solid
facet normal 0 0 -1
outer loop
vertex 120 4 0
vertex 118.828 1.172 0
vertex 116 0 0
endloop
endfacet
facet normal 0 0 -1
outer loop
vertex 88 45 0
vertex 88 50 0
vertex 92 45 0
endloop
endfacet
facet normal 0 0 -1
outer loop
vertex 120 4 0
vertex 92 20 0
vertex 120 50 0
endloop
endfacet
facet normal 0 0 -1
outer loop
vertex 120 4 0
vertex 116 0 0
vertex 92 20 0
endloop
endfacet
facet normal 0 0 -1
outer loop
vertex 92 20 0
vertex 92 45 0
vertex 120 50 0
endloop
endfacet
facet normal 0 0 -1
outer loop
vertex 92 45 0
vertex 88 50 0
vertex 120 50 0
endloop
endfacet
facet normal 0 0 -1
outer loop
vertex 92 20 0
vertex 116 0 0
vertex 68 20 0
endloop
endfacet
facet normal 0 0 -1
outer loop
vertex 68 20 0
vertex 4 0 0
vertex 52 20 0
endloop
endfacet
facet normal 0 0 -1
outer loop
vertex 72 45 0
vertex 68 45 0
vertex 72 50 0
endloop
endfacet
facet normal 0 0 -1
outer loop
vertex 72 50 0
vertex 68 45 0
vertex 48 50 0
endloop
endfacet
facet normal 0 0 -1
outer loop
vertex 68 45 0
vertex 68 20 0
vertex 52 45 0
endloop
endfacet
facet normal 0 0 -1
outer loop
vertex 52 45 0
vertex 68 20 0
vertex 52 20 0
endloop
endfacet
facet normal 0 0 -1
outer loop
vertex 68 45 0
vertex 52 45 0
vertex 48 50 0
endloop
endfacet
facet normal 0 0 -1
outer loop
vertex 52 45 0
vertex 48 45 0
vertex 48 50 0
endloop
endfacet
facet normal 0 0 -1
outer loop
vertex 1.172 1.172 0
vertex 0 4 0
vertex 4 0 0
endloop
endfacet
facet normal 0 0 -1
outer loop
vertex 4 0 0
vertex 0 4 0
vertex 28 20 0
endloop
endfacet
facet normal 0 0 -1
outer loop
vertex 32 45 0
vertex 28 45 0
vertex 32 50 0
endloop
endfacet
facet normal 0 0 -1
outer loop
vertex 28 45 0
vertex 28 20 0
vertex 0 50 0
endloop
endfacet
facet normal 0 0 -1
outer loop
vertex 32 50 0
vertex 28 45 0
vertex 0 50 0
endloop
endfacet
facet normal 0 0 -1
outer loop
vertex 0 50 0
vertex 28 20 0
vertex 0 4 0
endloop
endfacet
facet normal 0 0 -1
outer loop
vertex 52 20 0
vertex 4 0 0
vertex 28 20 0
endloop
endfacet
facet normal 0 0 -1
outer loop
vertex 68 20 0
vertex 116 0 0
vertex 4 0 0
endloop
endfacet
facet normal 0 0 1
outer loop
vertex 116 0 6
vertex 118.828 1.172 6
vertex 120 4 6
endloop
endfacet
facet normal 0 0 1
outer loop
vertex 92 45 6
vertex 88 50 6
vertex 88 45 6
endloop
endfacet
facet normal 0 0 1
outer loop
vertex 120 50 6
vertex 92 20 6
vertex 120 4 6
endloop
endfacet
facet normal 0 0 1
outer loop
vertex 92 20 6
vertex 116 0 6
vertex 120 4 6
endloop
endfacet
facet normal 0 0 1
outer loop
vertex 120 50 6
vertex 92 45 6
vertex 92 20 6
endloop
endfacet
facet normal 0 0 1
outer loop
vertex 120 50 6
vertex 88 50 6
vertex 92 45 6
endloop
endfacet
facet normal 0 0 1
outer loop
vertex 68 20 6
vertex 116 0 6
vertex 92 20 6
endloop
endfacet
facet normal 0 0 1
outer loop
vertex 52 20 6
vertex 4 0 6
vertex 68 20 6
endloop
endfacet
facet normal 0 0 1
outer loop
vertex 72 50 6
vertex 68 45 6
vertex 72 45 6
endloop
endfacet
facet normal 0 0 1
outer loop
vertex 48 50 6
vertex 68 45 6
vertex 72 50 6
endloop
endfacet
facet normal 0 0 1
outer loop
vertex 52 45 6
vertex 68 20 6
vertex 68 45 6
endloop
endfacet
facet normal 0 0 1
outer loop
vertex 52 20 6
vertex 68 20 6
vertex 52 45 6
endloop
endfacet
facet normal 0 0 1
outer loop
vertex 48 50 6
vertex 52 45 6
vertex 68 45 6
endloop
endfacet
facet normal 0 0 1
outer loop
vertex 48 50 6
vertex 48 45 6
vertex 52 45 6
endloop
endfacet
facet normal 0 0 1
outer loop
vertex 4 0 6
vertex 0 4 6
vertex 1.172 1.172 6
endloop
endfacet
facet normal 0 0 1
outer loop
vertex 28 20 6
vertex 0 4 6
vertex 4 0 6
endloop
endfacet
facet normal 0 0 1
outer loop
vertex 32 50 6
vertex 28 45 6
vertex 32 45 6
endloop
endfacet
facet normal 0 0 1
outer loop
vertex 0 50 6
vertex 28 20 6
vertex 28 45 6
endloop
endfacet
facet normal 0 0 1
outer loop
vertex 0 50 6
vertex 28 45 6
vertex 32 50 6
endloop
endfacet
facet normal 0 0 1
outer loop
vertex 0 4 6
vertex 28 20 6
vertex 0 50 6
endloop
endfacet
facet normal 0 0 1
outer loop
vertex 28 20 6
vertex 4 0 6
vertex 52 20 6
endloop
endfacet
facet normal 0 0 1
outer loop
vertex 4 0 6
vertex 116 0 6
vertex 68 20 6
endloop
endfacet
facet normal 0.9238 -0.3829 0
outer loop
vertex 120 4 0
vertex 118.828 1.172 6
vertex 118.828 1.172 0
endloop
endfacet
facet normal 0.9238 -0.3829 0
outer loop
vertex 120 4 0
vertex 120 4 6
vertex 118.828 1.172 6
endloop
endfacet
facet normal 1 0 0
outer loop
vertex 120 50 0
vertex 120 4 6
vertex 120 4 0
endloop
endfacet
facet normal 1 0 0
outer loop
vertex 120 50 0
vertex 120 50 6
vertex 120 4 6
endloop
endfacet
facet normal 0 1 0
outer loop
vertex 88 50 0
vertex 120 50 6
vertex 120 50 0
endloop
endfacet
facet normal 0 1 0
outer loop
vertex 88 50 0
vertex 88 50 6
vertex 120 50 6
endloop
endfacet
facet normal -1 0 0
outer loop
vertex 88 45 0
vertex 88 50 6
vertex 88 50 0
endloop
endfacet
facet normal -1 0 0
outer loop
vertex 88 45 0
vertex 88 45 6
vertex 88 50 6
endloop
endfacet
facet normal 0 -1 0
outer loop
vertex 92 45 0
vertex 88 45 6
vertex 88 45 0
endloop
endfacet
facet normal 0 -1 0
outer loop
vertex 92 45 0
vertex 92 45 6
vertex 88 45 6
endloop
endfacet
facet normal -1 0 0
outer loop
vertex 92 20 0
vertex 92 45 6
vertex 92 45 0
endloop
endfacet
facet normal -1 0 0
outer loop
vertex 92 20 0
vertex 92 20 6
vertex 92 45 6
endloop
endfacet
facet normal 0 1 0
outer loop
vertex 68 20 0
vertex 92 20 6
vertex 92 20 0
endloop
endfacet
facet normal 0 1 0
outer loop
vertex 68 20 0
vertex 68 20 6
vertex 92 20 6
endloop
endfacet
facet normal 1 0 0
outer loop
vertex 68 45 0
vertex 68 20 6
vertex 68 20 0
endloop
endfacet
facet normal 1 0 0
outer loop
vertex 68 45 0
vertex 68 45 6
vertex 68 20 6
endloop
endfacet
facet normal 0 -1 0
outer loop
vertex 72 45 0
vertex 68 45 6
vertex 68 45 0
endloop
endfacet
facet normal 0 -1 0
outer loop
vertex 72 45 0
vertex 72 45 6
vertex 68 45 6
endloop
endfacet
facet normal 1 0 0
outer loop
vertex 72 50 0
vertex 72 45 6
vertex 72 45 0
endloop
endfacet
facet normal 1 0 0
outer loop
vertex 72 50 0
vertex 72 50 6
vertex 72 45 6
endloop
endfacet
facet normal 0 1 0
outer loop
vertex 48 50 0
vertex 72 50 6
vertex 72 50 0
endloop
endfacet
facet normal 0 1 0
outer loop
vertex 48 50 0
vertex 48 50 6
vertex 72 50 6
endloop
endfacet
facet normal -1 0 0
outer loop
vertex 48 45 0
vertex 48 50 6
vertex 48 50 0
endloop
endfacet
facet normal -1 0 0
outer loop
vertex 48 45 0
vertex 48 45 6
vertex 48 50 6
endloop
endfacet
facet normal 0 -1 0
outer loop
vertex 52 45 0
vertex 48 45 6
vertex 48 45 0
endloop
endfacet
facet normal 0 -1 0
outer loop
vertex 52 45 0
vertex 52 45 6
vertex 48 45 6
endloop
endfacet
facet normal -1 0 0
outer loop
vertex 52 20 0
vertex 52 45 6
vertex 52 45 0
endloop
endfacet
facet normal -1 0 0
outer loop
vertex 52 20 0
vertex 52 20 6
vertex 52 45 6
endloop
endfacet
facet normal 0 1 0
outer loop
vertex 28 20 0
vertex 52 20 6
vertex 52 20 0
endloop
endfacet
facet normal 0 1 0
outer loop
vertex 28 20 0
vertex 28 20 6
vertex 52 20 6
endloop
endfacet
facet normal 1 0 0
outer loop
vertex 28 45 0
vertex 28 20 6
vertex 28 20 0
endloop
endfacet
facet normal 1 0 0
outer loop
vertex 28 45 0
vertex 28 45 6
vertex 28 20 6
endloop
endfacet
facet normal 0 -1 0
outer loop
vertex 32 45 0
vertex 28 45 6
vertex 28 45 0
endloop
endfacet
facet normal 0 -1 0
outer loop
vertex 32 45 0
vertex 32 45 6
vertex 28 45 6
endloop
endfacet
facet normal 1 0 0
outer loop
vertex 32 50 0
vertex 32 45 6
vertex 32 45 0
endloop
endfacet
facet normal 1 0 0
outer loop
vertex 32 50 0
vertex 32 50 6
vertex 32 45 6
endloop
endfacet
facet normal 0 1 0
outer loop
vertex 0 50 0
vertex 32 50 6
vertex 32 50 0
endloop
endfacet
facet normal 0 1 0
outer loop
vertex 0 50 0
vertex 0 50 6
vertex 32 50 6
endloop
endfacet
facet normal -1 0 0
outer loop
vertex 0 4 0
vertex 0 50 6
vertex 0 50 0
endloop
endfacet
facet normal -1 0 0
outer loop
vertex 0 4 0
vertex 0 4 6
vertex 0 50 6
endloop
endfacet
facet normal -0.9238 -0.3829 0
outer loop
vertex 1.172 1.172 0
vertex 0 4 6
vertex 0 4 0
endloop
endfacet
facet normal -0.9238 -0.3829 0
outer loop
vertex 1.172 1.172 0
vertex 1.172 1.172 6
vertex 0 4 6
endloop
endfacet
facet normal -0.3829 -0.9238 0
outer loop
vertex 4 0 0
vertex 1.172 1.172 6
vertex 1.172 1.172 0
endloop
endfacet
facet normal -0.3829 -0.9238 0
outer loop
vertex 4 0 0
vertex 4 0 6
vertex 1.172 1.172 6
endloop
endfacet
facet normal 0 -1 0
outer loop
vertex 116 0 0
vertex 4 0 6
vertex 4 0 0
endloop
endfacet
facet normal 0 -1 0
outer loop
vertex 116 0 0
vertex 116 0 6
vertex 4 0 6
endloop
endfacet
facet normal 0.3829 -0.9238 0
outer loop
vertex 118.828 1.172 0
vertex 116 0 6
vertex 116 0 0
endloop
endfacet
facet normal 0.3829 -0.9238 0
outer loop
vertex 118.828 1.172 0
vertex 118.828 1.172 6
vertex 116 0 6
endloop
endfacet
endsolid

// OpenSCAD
$fn = 32;

// ----------------------------------------------------------------------
// Oversize slot bar: 120 mm bar with 2 oversize windows
// ----------------------------------------------------------------------

// --- parameters (mm) ---
profile_height = 6;       // extrusion height
profile_points = 24;      // points of the closed outline

profile = [[0, 4], [1.172, 1.172], [4, 0], [116, 0], [118.828, 1.172], [120, 4], [120, 50], [88, 50], [88, 45], [92, 45], [92, 20], [68, 20], [68, 45], [72, 45], [72, 50], [48, 50], [48, 45], [52, 45], [52, 20], [28, 20], [28, 45], [32, 45], [32, 50], [0, 50]];  // single closed polygon, 24 points, counter clockwise

// --- the one profile operation ---
linear_extrude(height = profile_height) polygon(points = profile);
